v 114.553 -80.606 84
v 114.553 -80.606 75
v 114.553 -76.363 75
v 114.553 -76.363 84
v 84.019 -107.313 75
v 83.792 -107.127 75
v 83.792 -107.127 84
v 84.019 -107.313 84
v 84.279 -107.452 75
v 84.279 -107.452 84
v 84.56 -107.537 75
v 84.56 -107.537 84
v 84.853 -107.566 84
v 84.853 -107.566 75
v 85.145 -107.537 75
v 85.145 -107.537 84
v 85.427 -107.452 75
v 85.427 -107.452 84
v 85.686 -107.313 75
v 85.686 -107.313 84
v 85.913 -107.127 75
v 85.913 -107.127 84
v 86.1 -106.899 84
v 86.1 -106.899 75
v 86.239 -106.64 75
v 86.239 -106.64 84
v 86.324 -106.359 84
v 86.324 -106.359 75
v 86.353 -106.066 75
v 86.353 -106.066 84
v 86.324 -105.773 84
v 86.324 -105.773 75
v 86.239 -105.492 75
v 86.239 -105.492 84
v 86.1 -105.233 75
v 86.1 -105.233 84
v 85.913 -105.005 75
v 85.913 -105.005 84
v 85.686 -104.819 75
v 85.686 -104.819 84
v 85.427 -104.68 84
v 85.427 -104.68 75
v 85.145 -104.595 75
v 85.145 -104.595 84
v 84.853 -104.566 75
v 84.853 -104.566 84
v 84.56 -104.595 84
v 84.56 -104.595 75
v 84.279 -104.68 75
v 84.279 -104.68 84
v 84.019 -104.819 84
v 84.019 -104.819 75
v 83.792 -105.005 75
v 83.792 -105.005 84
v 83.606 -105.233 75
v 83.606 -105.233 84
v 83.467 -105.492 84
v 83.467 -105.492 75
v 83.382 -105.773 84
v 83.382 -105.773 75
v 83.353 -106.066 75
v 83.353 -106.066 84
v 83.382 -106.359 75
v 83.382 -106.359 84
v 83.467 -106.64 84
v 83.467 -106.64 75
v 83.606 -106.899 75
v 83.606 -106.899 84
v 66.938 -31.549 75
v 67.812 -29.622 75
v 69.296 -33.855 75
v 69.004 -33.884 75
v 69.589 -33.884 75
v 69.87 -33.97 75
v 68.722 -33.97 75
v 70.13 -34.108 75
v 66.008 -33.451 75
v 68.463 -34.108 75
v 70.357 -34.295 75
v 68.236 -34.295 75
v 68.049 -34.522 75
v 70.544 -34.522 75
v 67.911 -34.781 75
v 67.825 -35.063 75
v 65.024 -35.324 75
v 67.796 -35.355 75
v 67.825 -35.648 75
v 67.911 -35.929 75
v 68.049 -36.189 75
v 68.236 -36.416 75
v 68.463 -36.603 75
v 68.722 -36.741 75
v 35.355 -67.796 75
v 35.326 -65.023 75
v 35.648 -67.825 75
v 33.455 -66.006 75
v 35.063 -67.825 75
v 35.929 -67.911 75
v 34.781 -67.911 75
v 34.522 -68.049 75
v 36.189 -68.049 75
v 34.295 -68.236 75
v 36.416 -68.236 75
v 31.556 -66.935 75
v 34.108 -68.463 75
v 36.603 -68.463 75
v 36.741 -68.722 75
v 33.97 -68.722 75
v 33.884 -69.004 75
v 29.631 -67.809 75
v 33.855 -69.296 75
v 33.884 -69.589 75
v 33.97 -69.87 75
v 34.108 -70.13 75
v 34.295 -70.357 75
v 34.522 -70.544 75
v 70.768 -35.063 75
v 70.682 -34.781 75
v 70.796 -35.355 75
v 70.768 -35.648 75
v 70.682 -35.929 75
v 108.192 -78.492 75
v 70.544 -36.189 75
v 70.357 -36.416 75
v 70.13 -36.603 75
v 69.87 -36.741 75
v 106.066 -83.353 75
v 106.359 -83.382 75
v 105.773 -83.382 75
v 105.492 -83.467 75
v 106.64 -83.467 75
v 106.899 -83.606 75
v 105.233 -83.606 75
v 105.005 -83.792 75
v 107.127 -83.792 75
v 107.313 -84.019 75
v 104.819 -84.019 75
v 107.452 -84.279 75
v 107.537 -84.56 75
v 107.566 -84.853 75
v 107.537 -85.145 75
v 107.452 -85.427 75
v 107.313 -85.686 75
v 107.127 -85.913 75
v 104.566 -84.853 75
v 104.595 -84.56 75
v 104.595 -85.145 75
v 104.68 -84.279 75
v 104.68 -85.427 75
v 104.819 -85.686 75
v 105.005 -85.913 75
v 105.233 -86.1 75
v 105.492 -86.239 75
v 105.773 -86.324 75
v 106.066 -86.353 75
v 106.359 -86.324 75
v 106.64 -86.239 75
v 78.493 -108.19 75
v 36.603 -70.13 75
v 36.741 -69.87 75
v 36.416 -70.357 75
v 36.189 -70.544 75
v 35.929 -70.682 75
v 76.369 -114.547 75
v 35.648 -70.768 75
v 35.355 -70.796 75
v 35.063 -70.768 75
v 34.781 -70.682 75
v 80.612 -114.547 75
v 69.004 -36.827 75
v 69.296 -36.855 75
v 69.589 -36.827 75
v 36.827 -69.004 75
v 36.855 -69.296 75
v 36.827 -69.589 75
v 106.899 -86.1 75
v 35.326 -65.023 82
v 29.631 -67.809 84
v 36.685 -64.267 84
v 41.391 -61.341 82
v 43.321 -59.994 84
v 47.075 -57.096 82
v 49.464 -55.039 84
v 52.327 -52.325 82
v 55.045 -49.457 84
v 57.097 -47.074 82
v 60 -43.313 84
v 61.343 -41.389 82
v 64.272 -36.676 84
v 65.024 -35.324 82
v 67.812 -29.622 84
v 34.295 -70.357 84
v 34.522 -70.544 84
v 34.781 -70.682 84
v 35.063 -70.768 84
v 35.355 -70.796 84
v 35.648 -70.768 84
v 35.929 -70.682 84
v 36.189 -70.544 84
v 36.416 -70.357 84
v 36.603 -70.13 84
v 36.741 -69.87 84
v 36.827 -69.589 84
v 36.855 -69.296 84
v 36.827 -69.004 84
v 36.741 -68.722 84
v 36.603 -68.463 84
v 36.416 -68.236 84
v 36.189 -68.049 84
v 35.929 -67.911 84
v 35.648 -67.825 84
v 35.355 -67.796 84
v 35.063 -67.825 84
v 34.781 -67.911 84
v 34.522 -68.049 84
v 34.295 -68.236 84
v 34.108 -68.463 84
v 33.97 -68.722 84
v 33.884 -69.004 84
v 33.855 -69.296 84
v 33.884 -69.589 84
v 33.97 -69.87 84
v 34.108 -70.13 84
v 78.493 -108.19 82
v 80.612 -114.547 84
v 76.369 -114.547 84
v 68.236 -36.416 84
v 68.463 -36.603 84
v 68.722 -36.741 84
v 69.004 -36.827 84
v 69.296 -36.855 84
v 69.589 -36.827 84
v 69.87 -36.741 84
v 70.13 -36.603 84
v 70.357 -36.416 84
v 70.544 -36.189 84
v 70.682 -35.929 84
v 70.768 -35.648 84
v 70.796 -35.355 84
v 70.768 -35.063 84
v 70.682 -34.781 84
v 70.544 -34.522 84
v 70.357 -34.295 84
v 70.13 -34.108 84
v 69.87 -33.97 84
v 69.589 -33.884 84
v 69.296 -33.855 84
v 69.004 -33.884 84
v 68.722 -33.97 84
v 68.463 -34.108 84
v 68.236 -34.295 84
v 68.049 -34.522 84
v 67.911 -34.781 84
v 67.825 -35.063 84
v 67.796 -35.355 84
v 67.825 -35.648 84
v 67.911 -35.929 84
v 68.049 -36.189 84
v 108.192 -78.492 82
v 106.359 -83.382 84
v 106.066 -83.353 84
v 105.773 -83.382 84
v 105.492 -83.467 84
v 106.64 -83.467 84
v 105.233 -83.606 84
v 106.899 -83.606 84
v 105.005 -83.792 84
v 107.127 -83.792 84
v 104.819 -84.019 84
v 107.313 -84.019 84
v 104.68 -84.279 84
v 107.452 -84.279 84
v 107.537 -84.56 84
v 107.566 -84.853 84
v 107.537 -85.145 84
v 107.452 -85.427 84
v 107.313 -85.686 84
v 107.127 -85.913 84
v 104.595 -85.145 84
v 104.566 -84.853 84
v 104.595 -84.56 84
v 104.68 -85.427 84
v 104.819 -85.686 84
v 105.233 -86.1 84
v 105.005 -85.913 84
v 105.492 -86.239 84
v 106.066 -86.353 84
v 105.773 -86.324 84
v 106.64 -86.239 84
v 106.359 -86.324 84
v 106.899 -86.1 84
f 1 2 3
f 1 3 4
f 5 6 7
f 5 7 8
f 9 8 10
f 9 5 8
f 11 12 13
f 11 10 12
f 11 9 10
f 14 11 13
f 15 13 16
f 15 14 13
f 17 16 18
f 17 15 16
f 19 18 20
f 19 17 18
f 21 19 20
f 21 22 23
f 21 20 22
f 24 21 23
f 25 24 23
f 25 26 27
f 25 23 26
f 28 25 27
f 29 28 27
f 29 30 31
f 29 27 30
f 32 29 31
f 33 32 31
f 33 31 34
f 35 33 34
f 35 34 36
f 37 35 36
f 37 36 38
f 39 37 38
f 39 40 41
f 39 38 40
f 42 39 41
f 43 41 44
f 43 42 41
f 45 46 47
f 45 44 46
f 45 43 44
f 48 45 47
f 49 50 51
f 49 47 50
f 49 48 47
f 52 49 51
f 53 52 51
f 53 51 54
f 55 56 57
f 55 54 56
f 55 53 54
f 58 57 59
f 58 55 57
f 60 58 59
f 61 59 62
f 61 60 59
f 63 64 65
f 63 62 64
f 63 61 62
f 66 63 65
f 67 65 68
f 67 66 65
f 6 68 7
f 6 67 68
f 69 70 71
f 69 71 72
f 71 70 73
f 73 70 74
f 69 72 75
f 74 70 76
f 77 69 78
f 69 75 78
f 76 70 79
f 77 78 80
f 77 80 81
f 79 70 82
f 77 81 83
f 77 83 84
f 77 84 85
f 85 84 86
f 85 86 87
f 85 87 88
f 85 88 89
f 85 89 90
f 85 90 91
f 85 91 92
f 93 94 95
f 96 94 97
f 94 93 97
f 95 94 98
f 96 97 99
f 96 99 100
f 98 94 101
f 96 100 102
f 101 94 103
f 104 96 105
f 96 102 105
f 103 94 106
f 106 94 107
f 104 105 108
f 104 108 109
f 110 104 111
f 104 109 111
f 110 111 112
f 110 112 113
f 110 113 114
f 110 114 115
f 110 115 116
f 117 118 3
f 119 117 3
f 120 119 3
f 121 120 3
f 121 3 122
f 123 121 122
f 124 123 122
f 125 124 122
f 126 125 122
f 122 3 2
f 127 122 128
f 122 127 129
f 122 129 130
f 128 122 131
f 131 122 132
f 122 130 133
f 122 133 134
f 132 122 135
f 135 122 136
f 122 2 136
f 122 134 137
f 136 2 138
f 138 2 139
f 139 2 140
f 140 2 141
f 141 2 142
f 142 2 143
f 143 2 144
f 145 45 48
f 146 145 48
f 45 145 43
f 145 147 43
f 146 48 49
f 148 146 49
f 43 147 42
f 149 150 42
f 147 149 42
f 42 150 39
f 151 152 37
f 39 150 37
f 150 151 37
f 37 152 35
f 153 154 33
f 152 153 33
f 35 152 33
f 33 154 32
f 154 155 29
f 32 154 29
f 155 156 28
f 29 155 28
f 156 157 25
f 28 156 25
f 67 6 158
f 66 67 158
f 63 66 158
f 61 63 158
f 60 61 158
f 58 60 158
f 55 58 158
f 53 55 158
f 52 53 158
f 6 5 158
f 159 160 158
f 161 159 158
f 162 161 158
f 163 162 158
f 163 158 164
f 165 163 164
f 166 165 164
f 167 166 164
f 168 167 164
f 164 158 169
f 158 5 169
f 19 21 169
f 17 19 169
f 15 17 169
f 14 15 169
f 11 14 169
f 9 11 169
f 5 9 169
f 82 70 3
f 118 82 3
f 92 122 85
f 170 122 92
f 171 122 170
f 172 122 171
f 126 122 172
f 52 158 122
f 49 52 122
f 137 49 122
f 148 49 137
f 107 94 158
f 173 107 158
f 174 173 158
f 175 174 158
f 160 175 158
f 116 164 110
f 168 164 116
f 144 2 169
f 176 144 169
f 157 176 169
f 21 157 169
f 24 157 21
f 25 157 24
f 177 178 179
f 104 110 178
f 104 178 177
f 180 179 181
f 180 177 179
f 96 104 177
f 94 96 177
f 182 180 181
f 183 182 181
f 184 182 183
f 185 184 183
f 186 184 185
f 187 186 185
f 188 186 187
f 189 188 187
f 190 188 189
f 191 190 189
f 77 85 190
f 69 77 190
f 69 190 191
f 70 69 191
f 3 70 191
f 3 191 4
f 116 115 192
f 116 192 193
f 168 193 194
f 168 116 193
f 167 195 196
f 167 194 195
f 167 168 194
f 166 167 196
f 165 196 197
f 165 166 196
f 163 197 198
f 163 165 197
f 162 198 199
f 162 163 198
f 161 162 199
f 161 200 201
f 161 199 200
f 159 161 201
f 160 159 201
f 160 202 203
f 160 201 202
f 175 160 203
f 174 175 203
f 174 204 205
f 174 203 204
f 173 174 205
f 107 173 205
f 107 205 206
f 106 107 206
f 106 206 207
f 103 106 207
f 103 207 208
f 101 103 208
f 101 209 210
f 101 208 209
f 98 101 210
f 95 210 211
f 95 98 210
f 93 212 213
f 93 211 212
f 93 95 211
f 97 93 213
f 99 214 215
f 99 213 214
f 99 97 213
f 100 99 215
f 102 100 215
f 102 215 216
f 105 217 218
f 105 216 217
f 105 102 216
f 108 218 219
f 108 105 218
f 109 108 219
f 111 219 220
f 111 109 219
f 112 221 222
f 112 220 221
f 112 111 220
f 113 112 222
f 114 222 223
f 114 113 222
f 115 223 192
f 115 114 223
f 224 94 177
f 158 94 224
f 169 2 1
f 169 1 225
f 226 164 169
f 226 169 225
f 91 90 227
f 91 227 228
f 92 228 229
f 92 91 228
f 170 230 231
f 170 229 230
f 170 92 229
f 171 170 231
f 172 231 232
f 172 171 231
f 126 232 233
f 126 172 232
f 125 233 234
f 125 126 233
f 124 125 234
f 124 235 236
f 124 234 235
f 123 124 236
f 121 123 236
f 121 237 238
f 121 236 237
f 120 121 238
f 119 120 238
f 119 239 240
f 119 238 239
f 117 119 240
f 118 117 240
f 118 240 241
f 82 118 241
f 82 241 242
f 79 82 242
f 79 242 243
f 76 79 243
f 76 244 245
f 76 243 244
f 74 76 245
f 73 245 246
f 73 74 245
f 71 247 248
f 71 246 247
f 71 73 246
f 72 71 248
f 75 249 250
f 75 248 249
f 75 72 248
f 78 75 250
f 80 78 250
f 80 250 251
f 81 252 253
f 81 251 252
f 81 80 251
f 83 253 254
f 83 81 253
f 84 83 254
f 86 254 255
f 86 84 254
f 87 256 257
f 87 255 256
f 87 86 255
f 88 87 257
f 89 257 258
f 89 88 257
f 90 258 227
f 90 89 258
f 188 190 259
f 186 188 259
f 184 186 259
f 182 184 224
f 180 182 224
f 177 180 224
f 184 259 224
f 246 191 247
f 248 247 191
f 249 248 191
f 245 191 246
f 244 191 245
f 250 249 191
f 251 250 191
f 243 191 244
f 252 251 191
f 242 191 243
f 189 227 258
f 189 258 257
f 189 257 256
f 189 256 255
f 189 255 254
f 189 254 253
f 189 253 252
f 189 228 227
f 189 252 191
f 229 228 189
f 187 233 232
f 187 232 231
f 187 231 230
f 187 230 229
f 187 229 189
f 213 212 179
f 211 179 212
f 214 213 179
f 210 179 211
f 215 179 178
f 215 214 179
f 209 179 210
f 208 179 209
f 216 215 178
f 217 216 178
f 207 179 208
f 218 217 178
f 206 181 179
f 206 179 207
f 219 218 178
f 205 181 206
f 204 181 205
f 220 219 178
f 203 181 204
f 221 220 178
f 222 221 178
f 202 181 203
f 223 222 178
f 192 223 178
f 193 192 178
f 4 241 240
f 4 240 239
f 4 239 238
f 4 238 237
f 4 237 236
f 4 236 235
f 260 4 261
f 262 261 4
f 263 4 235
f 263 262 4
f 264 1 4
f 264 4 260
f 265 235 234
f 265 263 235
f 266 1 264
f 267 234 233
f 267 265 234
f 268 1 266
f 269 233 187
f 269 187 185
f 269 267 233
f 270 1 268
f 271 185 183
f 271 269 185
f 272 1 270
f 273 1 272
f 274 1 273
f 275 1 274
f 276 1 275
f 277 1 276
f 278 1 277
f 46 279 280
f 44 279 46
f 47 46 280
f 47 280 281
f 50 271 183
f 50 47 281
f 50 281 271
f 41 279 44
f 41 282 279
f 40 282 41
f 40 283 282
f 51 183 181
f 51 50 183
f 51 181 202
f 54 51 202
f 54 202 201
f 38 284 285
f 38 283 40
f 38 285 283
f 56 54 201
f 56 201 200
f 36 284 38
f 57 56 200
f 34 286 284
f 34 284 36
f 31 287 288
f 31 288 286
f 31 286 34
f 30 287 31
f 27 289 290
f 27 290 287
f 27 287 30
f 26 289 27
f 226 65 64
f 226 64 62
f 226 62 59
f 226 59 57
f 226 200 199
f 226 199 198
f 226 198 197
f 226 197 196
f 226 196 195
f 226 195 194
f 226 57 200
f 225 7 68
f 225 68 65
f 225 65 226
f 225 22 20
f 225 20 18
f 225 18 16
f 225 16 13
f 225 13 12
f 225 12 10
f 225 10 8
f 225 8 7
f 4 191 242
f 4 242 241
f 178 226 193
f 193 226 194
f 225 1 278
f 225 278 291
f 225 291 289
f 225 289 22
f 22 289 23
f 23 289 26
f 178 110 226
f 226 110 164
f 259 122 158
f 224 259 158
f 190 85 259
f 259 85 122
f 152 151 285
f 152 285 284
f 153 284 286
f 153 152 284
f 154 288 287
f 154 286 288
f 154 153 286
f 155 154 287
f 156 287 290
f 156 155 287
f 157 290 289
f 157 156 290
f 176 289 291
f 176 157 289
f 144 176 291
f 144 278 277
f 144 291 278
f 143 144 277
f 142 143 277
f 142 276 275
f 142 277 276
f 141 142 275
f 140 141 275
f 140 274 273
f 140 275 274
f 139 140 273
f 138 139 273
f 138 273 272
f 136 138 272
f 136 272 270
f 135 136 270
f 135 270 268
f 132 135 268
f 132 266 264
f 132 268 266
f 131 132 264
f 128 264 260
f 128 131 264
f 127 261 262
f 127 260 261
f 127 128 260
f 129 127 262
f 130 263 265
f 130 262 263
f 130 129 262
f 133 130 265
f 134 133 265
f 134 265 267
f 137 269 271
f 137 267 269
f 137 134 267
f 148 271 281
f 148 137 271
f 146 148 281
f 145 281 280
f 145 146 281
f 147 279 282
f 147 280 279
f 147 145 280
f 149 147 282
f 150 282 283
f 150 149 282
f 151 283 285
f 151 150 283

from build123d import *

# Parameters (mm, degrees)
CYLINDER2005_R               = 1.5
CYLINDER2005_DEPTH           = 60
CYLINDER2002_R               = 1.5
CYLINDER2002_DEPTH           = 60
CYLINDER2003_R               = 1.5
CYLINDER2003_DEPTH           = 60
CYLINDER2004_R               = 1.5
CYLINDER2004_DEPTH           = 60
COMPOUND1081_PLACEMENT_ANGLE = 225
CYLINDER1969_R               = 74
CYLINDER1969_DEPTH           = 40
BOX980_W                     = 42
BOX980_H                     = 72
BOX980_DEPTH                 = 50
COMPOUND1061_PLACEMENT_ANGLE = 225
BOX981_W                     = 54
BOX981_H                     = 78
BOX981_DEPTH                 = 9
COMPOUND1062_PLACEMENT_ANGLE = 225
CHAMFER072_SIZE              = 3


with BuildPart() as v_lec2005:
    # Cylinder2005 → Cylinder2005 (new body)
    with BuildSketch(Plane(origin=(-24, 74, -80), x_dir=(1, 0, 0), z_dir=(0, 0, 1))):
        Circle(CYLINDER2005_R)
    extrude(amount=CYLINDER2005_DEPTH)


with BuildPart() as v_lec2002:
    # Cylinder2002 → Cylinder2002 (new body)
    with BuildSketch(Plane(origin=(-15, 135, -80), x_dir=(1, 0, 0), z_dir=(0, 0, 1))):
        Circle(CYLINDER2002_R)
    extrude(amount=CYLINDER2002_DEPTH)


with BuildPart() as v_lec2003:
    # Cylinder2003 → Cylinder2003 (new body)
    with BuildSketch(Plane(origin=(15, 135, -80), x_dir=(1, 0, 0), z_dir=(0, 0, 1))):
        Circle(CYLINDER2003_R)
    extrude(amount=CYLINDER2003_DEPTH)


with BuildPart() as compound1081:
    # Cylinder2004 → Cylinder2004 (new body)
    with BuildSketch(Plane(origin=(24, 74, -80), x_dir=(1, 0, 0), z_dir=(0, 0, 1))):
        Circle(CYLINDER2004_R)
    extrude(amount=CYLINDER2004_DEPTH)

    # Compound1081: union Válec2005, Válec2002, Válec2003
    add(v_lec2005.part)
    add(v_lec2002.part)
    add(v_lec2003.part)


with BuildPart() as compound1081_1:
    # Compound1081 placement: moved
    add(compound1081.part.moved(Location((0, 0, 109))).rotate(Axis((0, 0, 109), (0, 0, 1)), COMPOUND1081_PLACEMENT_ANGLE))


with BuildPart() as v_lec1969:
    # Cylinder1969 → Cylinder1969 (new body)
    with BuildSketch(Plane.XY.offset(44)):
        Circle(CYLINDER1969_R)
    extrude(amount=CYLINDER1969_DEPTH)


with BuildPart() as compound1061:
    # Box980 → Box980 (new body)
    with BuildSketch(Plane(origin=(-21.001071, 60.005081, 31), x_dir=(1, 0, 0), z_dir=(0, 0, 1))):
        with Locations((21, 36)):
            Rectangle(BOX980_W, BOX980_H)
    extrude(amount=BOX980_DEPTH)


with BuildPart() as compound1061_1:
    # Compound1061 placement: moved
    add(compound1061.part.moved(Location((0, 0, 1))).rotate(Axis((0, 0, 1), (0, 0, 1)), COMPOUND1061_PLACEMENT_ANGLE))


with BuildPart() as cut677:
    # Box981 → Box981 (new body)
    with BuildSketch(Plane(origin=(-27.004408, 59.99801, 75), x_dir=(1, 0, 0), z_dir=(0, 0, 1))):
        with Locations((27, 39)):
            Rectangle(BOX981_W, BOX981_H)
    extrude(amount=BOX981_DEPTH)


with BuildPart() as cut677_1:
    # Compound1062 placement: moved
    add(cut677.part.rotate(Axis((0, 0, 0), (0, 0, 1)), COMPOUND1062_PLACEMENT_ANGLE))

    # Cut662: cut Compound1061
    add(compound1061_1.part, mode=Mode.SUBTRACT)

    # Cut663: cut Válec1969
    add(v_lec1969.part, mode=Mode.SUBTRACT)

    # Chamfer072
    chamfer072_edges = [cut677_1.edges().sort_by_distance(p)[0] for p in [
        (116.674329, -78.484329, 79.5),
        (78.490563, -116.668095, 79.5),
    ]]
    chamfer(chamfer072_edges, length=CHAMFER072_SIZE)

    # Cut677: cut Compound1081
    add(compound1081_1.part, mode=Mode.SUBTRACT)


solid = cut677_1.part
